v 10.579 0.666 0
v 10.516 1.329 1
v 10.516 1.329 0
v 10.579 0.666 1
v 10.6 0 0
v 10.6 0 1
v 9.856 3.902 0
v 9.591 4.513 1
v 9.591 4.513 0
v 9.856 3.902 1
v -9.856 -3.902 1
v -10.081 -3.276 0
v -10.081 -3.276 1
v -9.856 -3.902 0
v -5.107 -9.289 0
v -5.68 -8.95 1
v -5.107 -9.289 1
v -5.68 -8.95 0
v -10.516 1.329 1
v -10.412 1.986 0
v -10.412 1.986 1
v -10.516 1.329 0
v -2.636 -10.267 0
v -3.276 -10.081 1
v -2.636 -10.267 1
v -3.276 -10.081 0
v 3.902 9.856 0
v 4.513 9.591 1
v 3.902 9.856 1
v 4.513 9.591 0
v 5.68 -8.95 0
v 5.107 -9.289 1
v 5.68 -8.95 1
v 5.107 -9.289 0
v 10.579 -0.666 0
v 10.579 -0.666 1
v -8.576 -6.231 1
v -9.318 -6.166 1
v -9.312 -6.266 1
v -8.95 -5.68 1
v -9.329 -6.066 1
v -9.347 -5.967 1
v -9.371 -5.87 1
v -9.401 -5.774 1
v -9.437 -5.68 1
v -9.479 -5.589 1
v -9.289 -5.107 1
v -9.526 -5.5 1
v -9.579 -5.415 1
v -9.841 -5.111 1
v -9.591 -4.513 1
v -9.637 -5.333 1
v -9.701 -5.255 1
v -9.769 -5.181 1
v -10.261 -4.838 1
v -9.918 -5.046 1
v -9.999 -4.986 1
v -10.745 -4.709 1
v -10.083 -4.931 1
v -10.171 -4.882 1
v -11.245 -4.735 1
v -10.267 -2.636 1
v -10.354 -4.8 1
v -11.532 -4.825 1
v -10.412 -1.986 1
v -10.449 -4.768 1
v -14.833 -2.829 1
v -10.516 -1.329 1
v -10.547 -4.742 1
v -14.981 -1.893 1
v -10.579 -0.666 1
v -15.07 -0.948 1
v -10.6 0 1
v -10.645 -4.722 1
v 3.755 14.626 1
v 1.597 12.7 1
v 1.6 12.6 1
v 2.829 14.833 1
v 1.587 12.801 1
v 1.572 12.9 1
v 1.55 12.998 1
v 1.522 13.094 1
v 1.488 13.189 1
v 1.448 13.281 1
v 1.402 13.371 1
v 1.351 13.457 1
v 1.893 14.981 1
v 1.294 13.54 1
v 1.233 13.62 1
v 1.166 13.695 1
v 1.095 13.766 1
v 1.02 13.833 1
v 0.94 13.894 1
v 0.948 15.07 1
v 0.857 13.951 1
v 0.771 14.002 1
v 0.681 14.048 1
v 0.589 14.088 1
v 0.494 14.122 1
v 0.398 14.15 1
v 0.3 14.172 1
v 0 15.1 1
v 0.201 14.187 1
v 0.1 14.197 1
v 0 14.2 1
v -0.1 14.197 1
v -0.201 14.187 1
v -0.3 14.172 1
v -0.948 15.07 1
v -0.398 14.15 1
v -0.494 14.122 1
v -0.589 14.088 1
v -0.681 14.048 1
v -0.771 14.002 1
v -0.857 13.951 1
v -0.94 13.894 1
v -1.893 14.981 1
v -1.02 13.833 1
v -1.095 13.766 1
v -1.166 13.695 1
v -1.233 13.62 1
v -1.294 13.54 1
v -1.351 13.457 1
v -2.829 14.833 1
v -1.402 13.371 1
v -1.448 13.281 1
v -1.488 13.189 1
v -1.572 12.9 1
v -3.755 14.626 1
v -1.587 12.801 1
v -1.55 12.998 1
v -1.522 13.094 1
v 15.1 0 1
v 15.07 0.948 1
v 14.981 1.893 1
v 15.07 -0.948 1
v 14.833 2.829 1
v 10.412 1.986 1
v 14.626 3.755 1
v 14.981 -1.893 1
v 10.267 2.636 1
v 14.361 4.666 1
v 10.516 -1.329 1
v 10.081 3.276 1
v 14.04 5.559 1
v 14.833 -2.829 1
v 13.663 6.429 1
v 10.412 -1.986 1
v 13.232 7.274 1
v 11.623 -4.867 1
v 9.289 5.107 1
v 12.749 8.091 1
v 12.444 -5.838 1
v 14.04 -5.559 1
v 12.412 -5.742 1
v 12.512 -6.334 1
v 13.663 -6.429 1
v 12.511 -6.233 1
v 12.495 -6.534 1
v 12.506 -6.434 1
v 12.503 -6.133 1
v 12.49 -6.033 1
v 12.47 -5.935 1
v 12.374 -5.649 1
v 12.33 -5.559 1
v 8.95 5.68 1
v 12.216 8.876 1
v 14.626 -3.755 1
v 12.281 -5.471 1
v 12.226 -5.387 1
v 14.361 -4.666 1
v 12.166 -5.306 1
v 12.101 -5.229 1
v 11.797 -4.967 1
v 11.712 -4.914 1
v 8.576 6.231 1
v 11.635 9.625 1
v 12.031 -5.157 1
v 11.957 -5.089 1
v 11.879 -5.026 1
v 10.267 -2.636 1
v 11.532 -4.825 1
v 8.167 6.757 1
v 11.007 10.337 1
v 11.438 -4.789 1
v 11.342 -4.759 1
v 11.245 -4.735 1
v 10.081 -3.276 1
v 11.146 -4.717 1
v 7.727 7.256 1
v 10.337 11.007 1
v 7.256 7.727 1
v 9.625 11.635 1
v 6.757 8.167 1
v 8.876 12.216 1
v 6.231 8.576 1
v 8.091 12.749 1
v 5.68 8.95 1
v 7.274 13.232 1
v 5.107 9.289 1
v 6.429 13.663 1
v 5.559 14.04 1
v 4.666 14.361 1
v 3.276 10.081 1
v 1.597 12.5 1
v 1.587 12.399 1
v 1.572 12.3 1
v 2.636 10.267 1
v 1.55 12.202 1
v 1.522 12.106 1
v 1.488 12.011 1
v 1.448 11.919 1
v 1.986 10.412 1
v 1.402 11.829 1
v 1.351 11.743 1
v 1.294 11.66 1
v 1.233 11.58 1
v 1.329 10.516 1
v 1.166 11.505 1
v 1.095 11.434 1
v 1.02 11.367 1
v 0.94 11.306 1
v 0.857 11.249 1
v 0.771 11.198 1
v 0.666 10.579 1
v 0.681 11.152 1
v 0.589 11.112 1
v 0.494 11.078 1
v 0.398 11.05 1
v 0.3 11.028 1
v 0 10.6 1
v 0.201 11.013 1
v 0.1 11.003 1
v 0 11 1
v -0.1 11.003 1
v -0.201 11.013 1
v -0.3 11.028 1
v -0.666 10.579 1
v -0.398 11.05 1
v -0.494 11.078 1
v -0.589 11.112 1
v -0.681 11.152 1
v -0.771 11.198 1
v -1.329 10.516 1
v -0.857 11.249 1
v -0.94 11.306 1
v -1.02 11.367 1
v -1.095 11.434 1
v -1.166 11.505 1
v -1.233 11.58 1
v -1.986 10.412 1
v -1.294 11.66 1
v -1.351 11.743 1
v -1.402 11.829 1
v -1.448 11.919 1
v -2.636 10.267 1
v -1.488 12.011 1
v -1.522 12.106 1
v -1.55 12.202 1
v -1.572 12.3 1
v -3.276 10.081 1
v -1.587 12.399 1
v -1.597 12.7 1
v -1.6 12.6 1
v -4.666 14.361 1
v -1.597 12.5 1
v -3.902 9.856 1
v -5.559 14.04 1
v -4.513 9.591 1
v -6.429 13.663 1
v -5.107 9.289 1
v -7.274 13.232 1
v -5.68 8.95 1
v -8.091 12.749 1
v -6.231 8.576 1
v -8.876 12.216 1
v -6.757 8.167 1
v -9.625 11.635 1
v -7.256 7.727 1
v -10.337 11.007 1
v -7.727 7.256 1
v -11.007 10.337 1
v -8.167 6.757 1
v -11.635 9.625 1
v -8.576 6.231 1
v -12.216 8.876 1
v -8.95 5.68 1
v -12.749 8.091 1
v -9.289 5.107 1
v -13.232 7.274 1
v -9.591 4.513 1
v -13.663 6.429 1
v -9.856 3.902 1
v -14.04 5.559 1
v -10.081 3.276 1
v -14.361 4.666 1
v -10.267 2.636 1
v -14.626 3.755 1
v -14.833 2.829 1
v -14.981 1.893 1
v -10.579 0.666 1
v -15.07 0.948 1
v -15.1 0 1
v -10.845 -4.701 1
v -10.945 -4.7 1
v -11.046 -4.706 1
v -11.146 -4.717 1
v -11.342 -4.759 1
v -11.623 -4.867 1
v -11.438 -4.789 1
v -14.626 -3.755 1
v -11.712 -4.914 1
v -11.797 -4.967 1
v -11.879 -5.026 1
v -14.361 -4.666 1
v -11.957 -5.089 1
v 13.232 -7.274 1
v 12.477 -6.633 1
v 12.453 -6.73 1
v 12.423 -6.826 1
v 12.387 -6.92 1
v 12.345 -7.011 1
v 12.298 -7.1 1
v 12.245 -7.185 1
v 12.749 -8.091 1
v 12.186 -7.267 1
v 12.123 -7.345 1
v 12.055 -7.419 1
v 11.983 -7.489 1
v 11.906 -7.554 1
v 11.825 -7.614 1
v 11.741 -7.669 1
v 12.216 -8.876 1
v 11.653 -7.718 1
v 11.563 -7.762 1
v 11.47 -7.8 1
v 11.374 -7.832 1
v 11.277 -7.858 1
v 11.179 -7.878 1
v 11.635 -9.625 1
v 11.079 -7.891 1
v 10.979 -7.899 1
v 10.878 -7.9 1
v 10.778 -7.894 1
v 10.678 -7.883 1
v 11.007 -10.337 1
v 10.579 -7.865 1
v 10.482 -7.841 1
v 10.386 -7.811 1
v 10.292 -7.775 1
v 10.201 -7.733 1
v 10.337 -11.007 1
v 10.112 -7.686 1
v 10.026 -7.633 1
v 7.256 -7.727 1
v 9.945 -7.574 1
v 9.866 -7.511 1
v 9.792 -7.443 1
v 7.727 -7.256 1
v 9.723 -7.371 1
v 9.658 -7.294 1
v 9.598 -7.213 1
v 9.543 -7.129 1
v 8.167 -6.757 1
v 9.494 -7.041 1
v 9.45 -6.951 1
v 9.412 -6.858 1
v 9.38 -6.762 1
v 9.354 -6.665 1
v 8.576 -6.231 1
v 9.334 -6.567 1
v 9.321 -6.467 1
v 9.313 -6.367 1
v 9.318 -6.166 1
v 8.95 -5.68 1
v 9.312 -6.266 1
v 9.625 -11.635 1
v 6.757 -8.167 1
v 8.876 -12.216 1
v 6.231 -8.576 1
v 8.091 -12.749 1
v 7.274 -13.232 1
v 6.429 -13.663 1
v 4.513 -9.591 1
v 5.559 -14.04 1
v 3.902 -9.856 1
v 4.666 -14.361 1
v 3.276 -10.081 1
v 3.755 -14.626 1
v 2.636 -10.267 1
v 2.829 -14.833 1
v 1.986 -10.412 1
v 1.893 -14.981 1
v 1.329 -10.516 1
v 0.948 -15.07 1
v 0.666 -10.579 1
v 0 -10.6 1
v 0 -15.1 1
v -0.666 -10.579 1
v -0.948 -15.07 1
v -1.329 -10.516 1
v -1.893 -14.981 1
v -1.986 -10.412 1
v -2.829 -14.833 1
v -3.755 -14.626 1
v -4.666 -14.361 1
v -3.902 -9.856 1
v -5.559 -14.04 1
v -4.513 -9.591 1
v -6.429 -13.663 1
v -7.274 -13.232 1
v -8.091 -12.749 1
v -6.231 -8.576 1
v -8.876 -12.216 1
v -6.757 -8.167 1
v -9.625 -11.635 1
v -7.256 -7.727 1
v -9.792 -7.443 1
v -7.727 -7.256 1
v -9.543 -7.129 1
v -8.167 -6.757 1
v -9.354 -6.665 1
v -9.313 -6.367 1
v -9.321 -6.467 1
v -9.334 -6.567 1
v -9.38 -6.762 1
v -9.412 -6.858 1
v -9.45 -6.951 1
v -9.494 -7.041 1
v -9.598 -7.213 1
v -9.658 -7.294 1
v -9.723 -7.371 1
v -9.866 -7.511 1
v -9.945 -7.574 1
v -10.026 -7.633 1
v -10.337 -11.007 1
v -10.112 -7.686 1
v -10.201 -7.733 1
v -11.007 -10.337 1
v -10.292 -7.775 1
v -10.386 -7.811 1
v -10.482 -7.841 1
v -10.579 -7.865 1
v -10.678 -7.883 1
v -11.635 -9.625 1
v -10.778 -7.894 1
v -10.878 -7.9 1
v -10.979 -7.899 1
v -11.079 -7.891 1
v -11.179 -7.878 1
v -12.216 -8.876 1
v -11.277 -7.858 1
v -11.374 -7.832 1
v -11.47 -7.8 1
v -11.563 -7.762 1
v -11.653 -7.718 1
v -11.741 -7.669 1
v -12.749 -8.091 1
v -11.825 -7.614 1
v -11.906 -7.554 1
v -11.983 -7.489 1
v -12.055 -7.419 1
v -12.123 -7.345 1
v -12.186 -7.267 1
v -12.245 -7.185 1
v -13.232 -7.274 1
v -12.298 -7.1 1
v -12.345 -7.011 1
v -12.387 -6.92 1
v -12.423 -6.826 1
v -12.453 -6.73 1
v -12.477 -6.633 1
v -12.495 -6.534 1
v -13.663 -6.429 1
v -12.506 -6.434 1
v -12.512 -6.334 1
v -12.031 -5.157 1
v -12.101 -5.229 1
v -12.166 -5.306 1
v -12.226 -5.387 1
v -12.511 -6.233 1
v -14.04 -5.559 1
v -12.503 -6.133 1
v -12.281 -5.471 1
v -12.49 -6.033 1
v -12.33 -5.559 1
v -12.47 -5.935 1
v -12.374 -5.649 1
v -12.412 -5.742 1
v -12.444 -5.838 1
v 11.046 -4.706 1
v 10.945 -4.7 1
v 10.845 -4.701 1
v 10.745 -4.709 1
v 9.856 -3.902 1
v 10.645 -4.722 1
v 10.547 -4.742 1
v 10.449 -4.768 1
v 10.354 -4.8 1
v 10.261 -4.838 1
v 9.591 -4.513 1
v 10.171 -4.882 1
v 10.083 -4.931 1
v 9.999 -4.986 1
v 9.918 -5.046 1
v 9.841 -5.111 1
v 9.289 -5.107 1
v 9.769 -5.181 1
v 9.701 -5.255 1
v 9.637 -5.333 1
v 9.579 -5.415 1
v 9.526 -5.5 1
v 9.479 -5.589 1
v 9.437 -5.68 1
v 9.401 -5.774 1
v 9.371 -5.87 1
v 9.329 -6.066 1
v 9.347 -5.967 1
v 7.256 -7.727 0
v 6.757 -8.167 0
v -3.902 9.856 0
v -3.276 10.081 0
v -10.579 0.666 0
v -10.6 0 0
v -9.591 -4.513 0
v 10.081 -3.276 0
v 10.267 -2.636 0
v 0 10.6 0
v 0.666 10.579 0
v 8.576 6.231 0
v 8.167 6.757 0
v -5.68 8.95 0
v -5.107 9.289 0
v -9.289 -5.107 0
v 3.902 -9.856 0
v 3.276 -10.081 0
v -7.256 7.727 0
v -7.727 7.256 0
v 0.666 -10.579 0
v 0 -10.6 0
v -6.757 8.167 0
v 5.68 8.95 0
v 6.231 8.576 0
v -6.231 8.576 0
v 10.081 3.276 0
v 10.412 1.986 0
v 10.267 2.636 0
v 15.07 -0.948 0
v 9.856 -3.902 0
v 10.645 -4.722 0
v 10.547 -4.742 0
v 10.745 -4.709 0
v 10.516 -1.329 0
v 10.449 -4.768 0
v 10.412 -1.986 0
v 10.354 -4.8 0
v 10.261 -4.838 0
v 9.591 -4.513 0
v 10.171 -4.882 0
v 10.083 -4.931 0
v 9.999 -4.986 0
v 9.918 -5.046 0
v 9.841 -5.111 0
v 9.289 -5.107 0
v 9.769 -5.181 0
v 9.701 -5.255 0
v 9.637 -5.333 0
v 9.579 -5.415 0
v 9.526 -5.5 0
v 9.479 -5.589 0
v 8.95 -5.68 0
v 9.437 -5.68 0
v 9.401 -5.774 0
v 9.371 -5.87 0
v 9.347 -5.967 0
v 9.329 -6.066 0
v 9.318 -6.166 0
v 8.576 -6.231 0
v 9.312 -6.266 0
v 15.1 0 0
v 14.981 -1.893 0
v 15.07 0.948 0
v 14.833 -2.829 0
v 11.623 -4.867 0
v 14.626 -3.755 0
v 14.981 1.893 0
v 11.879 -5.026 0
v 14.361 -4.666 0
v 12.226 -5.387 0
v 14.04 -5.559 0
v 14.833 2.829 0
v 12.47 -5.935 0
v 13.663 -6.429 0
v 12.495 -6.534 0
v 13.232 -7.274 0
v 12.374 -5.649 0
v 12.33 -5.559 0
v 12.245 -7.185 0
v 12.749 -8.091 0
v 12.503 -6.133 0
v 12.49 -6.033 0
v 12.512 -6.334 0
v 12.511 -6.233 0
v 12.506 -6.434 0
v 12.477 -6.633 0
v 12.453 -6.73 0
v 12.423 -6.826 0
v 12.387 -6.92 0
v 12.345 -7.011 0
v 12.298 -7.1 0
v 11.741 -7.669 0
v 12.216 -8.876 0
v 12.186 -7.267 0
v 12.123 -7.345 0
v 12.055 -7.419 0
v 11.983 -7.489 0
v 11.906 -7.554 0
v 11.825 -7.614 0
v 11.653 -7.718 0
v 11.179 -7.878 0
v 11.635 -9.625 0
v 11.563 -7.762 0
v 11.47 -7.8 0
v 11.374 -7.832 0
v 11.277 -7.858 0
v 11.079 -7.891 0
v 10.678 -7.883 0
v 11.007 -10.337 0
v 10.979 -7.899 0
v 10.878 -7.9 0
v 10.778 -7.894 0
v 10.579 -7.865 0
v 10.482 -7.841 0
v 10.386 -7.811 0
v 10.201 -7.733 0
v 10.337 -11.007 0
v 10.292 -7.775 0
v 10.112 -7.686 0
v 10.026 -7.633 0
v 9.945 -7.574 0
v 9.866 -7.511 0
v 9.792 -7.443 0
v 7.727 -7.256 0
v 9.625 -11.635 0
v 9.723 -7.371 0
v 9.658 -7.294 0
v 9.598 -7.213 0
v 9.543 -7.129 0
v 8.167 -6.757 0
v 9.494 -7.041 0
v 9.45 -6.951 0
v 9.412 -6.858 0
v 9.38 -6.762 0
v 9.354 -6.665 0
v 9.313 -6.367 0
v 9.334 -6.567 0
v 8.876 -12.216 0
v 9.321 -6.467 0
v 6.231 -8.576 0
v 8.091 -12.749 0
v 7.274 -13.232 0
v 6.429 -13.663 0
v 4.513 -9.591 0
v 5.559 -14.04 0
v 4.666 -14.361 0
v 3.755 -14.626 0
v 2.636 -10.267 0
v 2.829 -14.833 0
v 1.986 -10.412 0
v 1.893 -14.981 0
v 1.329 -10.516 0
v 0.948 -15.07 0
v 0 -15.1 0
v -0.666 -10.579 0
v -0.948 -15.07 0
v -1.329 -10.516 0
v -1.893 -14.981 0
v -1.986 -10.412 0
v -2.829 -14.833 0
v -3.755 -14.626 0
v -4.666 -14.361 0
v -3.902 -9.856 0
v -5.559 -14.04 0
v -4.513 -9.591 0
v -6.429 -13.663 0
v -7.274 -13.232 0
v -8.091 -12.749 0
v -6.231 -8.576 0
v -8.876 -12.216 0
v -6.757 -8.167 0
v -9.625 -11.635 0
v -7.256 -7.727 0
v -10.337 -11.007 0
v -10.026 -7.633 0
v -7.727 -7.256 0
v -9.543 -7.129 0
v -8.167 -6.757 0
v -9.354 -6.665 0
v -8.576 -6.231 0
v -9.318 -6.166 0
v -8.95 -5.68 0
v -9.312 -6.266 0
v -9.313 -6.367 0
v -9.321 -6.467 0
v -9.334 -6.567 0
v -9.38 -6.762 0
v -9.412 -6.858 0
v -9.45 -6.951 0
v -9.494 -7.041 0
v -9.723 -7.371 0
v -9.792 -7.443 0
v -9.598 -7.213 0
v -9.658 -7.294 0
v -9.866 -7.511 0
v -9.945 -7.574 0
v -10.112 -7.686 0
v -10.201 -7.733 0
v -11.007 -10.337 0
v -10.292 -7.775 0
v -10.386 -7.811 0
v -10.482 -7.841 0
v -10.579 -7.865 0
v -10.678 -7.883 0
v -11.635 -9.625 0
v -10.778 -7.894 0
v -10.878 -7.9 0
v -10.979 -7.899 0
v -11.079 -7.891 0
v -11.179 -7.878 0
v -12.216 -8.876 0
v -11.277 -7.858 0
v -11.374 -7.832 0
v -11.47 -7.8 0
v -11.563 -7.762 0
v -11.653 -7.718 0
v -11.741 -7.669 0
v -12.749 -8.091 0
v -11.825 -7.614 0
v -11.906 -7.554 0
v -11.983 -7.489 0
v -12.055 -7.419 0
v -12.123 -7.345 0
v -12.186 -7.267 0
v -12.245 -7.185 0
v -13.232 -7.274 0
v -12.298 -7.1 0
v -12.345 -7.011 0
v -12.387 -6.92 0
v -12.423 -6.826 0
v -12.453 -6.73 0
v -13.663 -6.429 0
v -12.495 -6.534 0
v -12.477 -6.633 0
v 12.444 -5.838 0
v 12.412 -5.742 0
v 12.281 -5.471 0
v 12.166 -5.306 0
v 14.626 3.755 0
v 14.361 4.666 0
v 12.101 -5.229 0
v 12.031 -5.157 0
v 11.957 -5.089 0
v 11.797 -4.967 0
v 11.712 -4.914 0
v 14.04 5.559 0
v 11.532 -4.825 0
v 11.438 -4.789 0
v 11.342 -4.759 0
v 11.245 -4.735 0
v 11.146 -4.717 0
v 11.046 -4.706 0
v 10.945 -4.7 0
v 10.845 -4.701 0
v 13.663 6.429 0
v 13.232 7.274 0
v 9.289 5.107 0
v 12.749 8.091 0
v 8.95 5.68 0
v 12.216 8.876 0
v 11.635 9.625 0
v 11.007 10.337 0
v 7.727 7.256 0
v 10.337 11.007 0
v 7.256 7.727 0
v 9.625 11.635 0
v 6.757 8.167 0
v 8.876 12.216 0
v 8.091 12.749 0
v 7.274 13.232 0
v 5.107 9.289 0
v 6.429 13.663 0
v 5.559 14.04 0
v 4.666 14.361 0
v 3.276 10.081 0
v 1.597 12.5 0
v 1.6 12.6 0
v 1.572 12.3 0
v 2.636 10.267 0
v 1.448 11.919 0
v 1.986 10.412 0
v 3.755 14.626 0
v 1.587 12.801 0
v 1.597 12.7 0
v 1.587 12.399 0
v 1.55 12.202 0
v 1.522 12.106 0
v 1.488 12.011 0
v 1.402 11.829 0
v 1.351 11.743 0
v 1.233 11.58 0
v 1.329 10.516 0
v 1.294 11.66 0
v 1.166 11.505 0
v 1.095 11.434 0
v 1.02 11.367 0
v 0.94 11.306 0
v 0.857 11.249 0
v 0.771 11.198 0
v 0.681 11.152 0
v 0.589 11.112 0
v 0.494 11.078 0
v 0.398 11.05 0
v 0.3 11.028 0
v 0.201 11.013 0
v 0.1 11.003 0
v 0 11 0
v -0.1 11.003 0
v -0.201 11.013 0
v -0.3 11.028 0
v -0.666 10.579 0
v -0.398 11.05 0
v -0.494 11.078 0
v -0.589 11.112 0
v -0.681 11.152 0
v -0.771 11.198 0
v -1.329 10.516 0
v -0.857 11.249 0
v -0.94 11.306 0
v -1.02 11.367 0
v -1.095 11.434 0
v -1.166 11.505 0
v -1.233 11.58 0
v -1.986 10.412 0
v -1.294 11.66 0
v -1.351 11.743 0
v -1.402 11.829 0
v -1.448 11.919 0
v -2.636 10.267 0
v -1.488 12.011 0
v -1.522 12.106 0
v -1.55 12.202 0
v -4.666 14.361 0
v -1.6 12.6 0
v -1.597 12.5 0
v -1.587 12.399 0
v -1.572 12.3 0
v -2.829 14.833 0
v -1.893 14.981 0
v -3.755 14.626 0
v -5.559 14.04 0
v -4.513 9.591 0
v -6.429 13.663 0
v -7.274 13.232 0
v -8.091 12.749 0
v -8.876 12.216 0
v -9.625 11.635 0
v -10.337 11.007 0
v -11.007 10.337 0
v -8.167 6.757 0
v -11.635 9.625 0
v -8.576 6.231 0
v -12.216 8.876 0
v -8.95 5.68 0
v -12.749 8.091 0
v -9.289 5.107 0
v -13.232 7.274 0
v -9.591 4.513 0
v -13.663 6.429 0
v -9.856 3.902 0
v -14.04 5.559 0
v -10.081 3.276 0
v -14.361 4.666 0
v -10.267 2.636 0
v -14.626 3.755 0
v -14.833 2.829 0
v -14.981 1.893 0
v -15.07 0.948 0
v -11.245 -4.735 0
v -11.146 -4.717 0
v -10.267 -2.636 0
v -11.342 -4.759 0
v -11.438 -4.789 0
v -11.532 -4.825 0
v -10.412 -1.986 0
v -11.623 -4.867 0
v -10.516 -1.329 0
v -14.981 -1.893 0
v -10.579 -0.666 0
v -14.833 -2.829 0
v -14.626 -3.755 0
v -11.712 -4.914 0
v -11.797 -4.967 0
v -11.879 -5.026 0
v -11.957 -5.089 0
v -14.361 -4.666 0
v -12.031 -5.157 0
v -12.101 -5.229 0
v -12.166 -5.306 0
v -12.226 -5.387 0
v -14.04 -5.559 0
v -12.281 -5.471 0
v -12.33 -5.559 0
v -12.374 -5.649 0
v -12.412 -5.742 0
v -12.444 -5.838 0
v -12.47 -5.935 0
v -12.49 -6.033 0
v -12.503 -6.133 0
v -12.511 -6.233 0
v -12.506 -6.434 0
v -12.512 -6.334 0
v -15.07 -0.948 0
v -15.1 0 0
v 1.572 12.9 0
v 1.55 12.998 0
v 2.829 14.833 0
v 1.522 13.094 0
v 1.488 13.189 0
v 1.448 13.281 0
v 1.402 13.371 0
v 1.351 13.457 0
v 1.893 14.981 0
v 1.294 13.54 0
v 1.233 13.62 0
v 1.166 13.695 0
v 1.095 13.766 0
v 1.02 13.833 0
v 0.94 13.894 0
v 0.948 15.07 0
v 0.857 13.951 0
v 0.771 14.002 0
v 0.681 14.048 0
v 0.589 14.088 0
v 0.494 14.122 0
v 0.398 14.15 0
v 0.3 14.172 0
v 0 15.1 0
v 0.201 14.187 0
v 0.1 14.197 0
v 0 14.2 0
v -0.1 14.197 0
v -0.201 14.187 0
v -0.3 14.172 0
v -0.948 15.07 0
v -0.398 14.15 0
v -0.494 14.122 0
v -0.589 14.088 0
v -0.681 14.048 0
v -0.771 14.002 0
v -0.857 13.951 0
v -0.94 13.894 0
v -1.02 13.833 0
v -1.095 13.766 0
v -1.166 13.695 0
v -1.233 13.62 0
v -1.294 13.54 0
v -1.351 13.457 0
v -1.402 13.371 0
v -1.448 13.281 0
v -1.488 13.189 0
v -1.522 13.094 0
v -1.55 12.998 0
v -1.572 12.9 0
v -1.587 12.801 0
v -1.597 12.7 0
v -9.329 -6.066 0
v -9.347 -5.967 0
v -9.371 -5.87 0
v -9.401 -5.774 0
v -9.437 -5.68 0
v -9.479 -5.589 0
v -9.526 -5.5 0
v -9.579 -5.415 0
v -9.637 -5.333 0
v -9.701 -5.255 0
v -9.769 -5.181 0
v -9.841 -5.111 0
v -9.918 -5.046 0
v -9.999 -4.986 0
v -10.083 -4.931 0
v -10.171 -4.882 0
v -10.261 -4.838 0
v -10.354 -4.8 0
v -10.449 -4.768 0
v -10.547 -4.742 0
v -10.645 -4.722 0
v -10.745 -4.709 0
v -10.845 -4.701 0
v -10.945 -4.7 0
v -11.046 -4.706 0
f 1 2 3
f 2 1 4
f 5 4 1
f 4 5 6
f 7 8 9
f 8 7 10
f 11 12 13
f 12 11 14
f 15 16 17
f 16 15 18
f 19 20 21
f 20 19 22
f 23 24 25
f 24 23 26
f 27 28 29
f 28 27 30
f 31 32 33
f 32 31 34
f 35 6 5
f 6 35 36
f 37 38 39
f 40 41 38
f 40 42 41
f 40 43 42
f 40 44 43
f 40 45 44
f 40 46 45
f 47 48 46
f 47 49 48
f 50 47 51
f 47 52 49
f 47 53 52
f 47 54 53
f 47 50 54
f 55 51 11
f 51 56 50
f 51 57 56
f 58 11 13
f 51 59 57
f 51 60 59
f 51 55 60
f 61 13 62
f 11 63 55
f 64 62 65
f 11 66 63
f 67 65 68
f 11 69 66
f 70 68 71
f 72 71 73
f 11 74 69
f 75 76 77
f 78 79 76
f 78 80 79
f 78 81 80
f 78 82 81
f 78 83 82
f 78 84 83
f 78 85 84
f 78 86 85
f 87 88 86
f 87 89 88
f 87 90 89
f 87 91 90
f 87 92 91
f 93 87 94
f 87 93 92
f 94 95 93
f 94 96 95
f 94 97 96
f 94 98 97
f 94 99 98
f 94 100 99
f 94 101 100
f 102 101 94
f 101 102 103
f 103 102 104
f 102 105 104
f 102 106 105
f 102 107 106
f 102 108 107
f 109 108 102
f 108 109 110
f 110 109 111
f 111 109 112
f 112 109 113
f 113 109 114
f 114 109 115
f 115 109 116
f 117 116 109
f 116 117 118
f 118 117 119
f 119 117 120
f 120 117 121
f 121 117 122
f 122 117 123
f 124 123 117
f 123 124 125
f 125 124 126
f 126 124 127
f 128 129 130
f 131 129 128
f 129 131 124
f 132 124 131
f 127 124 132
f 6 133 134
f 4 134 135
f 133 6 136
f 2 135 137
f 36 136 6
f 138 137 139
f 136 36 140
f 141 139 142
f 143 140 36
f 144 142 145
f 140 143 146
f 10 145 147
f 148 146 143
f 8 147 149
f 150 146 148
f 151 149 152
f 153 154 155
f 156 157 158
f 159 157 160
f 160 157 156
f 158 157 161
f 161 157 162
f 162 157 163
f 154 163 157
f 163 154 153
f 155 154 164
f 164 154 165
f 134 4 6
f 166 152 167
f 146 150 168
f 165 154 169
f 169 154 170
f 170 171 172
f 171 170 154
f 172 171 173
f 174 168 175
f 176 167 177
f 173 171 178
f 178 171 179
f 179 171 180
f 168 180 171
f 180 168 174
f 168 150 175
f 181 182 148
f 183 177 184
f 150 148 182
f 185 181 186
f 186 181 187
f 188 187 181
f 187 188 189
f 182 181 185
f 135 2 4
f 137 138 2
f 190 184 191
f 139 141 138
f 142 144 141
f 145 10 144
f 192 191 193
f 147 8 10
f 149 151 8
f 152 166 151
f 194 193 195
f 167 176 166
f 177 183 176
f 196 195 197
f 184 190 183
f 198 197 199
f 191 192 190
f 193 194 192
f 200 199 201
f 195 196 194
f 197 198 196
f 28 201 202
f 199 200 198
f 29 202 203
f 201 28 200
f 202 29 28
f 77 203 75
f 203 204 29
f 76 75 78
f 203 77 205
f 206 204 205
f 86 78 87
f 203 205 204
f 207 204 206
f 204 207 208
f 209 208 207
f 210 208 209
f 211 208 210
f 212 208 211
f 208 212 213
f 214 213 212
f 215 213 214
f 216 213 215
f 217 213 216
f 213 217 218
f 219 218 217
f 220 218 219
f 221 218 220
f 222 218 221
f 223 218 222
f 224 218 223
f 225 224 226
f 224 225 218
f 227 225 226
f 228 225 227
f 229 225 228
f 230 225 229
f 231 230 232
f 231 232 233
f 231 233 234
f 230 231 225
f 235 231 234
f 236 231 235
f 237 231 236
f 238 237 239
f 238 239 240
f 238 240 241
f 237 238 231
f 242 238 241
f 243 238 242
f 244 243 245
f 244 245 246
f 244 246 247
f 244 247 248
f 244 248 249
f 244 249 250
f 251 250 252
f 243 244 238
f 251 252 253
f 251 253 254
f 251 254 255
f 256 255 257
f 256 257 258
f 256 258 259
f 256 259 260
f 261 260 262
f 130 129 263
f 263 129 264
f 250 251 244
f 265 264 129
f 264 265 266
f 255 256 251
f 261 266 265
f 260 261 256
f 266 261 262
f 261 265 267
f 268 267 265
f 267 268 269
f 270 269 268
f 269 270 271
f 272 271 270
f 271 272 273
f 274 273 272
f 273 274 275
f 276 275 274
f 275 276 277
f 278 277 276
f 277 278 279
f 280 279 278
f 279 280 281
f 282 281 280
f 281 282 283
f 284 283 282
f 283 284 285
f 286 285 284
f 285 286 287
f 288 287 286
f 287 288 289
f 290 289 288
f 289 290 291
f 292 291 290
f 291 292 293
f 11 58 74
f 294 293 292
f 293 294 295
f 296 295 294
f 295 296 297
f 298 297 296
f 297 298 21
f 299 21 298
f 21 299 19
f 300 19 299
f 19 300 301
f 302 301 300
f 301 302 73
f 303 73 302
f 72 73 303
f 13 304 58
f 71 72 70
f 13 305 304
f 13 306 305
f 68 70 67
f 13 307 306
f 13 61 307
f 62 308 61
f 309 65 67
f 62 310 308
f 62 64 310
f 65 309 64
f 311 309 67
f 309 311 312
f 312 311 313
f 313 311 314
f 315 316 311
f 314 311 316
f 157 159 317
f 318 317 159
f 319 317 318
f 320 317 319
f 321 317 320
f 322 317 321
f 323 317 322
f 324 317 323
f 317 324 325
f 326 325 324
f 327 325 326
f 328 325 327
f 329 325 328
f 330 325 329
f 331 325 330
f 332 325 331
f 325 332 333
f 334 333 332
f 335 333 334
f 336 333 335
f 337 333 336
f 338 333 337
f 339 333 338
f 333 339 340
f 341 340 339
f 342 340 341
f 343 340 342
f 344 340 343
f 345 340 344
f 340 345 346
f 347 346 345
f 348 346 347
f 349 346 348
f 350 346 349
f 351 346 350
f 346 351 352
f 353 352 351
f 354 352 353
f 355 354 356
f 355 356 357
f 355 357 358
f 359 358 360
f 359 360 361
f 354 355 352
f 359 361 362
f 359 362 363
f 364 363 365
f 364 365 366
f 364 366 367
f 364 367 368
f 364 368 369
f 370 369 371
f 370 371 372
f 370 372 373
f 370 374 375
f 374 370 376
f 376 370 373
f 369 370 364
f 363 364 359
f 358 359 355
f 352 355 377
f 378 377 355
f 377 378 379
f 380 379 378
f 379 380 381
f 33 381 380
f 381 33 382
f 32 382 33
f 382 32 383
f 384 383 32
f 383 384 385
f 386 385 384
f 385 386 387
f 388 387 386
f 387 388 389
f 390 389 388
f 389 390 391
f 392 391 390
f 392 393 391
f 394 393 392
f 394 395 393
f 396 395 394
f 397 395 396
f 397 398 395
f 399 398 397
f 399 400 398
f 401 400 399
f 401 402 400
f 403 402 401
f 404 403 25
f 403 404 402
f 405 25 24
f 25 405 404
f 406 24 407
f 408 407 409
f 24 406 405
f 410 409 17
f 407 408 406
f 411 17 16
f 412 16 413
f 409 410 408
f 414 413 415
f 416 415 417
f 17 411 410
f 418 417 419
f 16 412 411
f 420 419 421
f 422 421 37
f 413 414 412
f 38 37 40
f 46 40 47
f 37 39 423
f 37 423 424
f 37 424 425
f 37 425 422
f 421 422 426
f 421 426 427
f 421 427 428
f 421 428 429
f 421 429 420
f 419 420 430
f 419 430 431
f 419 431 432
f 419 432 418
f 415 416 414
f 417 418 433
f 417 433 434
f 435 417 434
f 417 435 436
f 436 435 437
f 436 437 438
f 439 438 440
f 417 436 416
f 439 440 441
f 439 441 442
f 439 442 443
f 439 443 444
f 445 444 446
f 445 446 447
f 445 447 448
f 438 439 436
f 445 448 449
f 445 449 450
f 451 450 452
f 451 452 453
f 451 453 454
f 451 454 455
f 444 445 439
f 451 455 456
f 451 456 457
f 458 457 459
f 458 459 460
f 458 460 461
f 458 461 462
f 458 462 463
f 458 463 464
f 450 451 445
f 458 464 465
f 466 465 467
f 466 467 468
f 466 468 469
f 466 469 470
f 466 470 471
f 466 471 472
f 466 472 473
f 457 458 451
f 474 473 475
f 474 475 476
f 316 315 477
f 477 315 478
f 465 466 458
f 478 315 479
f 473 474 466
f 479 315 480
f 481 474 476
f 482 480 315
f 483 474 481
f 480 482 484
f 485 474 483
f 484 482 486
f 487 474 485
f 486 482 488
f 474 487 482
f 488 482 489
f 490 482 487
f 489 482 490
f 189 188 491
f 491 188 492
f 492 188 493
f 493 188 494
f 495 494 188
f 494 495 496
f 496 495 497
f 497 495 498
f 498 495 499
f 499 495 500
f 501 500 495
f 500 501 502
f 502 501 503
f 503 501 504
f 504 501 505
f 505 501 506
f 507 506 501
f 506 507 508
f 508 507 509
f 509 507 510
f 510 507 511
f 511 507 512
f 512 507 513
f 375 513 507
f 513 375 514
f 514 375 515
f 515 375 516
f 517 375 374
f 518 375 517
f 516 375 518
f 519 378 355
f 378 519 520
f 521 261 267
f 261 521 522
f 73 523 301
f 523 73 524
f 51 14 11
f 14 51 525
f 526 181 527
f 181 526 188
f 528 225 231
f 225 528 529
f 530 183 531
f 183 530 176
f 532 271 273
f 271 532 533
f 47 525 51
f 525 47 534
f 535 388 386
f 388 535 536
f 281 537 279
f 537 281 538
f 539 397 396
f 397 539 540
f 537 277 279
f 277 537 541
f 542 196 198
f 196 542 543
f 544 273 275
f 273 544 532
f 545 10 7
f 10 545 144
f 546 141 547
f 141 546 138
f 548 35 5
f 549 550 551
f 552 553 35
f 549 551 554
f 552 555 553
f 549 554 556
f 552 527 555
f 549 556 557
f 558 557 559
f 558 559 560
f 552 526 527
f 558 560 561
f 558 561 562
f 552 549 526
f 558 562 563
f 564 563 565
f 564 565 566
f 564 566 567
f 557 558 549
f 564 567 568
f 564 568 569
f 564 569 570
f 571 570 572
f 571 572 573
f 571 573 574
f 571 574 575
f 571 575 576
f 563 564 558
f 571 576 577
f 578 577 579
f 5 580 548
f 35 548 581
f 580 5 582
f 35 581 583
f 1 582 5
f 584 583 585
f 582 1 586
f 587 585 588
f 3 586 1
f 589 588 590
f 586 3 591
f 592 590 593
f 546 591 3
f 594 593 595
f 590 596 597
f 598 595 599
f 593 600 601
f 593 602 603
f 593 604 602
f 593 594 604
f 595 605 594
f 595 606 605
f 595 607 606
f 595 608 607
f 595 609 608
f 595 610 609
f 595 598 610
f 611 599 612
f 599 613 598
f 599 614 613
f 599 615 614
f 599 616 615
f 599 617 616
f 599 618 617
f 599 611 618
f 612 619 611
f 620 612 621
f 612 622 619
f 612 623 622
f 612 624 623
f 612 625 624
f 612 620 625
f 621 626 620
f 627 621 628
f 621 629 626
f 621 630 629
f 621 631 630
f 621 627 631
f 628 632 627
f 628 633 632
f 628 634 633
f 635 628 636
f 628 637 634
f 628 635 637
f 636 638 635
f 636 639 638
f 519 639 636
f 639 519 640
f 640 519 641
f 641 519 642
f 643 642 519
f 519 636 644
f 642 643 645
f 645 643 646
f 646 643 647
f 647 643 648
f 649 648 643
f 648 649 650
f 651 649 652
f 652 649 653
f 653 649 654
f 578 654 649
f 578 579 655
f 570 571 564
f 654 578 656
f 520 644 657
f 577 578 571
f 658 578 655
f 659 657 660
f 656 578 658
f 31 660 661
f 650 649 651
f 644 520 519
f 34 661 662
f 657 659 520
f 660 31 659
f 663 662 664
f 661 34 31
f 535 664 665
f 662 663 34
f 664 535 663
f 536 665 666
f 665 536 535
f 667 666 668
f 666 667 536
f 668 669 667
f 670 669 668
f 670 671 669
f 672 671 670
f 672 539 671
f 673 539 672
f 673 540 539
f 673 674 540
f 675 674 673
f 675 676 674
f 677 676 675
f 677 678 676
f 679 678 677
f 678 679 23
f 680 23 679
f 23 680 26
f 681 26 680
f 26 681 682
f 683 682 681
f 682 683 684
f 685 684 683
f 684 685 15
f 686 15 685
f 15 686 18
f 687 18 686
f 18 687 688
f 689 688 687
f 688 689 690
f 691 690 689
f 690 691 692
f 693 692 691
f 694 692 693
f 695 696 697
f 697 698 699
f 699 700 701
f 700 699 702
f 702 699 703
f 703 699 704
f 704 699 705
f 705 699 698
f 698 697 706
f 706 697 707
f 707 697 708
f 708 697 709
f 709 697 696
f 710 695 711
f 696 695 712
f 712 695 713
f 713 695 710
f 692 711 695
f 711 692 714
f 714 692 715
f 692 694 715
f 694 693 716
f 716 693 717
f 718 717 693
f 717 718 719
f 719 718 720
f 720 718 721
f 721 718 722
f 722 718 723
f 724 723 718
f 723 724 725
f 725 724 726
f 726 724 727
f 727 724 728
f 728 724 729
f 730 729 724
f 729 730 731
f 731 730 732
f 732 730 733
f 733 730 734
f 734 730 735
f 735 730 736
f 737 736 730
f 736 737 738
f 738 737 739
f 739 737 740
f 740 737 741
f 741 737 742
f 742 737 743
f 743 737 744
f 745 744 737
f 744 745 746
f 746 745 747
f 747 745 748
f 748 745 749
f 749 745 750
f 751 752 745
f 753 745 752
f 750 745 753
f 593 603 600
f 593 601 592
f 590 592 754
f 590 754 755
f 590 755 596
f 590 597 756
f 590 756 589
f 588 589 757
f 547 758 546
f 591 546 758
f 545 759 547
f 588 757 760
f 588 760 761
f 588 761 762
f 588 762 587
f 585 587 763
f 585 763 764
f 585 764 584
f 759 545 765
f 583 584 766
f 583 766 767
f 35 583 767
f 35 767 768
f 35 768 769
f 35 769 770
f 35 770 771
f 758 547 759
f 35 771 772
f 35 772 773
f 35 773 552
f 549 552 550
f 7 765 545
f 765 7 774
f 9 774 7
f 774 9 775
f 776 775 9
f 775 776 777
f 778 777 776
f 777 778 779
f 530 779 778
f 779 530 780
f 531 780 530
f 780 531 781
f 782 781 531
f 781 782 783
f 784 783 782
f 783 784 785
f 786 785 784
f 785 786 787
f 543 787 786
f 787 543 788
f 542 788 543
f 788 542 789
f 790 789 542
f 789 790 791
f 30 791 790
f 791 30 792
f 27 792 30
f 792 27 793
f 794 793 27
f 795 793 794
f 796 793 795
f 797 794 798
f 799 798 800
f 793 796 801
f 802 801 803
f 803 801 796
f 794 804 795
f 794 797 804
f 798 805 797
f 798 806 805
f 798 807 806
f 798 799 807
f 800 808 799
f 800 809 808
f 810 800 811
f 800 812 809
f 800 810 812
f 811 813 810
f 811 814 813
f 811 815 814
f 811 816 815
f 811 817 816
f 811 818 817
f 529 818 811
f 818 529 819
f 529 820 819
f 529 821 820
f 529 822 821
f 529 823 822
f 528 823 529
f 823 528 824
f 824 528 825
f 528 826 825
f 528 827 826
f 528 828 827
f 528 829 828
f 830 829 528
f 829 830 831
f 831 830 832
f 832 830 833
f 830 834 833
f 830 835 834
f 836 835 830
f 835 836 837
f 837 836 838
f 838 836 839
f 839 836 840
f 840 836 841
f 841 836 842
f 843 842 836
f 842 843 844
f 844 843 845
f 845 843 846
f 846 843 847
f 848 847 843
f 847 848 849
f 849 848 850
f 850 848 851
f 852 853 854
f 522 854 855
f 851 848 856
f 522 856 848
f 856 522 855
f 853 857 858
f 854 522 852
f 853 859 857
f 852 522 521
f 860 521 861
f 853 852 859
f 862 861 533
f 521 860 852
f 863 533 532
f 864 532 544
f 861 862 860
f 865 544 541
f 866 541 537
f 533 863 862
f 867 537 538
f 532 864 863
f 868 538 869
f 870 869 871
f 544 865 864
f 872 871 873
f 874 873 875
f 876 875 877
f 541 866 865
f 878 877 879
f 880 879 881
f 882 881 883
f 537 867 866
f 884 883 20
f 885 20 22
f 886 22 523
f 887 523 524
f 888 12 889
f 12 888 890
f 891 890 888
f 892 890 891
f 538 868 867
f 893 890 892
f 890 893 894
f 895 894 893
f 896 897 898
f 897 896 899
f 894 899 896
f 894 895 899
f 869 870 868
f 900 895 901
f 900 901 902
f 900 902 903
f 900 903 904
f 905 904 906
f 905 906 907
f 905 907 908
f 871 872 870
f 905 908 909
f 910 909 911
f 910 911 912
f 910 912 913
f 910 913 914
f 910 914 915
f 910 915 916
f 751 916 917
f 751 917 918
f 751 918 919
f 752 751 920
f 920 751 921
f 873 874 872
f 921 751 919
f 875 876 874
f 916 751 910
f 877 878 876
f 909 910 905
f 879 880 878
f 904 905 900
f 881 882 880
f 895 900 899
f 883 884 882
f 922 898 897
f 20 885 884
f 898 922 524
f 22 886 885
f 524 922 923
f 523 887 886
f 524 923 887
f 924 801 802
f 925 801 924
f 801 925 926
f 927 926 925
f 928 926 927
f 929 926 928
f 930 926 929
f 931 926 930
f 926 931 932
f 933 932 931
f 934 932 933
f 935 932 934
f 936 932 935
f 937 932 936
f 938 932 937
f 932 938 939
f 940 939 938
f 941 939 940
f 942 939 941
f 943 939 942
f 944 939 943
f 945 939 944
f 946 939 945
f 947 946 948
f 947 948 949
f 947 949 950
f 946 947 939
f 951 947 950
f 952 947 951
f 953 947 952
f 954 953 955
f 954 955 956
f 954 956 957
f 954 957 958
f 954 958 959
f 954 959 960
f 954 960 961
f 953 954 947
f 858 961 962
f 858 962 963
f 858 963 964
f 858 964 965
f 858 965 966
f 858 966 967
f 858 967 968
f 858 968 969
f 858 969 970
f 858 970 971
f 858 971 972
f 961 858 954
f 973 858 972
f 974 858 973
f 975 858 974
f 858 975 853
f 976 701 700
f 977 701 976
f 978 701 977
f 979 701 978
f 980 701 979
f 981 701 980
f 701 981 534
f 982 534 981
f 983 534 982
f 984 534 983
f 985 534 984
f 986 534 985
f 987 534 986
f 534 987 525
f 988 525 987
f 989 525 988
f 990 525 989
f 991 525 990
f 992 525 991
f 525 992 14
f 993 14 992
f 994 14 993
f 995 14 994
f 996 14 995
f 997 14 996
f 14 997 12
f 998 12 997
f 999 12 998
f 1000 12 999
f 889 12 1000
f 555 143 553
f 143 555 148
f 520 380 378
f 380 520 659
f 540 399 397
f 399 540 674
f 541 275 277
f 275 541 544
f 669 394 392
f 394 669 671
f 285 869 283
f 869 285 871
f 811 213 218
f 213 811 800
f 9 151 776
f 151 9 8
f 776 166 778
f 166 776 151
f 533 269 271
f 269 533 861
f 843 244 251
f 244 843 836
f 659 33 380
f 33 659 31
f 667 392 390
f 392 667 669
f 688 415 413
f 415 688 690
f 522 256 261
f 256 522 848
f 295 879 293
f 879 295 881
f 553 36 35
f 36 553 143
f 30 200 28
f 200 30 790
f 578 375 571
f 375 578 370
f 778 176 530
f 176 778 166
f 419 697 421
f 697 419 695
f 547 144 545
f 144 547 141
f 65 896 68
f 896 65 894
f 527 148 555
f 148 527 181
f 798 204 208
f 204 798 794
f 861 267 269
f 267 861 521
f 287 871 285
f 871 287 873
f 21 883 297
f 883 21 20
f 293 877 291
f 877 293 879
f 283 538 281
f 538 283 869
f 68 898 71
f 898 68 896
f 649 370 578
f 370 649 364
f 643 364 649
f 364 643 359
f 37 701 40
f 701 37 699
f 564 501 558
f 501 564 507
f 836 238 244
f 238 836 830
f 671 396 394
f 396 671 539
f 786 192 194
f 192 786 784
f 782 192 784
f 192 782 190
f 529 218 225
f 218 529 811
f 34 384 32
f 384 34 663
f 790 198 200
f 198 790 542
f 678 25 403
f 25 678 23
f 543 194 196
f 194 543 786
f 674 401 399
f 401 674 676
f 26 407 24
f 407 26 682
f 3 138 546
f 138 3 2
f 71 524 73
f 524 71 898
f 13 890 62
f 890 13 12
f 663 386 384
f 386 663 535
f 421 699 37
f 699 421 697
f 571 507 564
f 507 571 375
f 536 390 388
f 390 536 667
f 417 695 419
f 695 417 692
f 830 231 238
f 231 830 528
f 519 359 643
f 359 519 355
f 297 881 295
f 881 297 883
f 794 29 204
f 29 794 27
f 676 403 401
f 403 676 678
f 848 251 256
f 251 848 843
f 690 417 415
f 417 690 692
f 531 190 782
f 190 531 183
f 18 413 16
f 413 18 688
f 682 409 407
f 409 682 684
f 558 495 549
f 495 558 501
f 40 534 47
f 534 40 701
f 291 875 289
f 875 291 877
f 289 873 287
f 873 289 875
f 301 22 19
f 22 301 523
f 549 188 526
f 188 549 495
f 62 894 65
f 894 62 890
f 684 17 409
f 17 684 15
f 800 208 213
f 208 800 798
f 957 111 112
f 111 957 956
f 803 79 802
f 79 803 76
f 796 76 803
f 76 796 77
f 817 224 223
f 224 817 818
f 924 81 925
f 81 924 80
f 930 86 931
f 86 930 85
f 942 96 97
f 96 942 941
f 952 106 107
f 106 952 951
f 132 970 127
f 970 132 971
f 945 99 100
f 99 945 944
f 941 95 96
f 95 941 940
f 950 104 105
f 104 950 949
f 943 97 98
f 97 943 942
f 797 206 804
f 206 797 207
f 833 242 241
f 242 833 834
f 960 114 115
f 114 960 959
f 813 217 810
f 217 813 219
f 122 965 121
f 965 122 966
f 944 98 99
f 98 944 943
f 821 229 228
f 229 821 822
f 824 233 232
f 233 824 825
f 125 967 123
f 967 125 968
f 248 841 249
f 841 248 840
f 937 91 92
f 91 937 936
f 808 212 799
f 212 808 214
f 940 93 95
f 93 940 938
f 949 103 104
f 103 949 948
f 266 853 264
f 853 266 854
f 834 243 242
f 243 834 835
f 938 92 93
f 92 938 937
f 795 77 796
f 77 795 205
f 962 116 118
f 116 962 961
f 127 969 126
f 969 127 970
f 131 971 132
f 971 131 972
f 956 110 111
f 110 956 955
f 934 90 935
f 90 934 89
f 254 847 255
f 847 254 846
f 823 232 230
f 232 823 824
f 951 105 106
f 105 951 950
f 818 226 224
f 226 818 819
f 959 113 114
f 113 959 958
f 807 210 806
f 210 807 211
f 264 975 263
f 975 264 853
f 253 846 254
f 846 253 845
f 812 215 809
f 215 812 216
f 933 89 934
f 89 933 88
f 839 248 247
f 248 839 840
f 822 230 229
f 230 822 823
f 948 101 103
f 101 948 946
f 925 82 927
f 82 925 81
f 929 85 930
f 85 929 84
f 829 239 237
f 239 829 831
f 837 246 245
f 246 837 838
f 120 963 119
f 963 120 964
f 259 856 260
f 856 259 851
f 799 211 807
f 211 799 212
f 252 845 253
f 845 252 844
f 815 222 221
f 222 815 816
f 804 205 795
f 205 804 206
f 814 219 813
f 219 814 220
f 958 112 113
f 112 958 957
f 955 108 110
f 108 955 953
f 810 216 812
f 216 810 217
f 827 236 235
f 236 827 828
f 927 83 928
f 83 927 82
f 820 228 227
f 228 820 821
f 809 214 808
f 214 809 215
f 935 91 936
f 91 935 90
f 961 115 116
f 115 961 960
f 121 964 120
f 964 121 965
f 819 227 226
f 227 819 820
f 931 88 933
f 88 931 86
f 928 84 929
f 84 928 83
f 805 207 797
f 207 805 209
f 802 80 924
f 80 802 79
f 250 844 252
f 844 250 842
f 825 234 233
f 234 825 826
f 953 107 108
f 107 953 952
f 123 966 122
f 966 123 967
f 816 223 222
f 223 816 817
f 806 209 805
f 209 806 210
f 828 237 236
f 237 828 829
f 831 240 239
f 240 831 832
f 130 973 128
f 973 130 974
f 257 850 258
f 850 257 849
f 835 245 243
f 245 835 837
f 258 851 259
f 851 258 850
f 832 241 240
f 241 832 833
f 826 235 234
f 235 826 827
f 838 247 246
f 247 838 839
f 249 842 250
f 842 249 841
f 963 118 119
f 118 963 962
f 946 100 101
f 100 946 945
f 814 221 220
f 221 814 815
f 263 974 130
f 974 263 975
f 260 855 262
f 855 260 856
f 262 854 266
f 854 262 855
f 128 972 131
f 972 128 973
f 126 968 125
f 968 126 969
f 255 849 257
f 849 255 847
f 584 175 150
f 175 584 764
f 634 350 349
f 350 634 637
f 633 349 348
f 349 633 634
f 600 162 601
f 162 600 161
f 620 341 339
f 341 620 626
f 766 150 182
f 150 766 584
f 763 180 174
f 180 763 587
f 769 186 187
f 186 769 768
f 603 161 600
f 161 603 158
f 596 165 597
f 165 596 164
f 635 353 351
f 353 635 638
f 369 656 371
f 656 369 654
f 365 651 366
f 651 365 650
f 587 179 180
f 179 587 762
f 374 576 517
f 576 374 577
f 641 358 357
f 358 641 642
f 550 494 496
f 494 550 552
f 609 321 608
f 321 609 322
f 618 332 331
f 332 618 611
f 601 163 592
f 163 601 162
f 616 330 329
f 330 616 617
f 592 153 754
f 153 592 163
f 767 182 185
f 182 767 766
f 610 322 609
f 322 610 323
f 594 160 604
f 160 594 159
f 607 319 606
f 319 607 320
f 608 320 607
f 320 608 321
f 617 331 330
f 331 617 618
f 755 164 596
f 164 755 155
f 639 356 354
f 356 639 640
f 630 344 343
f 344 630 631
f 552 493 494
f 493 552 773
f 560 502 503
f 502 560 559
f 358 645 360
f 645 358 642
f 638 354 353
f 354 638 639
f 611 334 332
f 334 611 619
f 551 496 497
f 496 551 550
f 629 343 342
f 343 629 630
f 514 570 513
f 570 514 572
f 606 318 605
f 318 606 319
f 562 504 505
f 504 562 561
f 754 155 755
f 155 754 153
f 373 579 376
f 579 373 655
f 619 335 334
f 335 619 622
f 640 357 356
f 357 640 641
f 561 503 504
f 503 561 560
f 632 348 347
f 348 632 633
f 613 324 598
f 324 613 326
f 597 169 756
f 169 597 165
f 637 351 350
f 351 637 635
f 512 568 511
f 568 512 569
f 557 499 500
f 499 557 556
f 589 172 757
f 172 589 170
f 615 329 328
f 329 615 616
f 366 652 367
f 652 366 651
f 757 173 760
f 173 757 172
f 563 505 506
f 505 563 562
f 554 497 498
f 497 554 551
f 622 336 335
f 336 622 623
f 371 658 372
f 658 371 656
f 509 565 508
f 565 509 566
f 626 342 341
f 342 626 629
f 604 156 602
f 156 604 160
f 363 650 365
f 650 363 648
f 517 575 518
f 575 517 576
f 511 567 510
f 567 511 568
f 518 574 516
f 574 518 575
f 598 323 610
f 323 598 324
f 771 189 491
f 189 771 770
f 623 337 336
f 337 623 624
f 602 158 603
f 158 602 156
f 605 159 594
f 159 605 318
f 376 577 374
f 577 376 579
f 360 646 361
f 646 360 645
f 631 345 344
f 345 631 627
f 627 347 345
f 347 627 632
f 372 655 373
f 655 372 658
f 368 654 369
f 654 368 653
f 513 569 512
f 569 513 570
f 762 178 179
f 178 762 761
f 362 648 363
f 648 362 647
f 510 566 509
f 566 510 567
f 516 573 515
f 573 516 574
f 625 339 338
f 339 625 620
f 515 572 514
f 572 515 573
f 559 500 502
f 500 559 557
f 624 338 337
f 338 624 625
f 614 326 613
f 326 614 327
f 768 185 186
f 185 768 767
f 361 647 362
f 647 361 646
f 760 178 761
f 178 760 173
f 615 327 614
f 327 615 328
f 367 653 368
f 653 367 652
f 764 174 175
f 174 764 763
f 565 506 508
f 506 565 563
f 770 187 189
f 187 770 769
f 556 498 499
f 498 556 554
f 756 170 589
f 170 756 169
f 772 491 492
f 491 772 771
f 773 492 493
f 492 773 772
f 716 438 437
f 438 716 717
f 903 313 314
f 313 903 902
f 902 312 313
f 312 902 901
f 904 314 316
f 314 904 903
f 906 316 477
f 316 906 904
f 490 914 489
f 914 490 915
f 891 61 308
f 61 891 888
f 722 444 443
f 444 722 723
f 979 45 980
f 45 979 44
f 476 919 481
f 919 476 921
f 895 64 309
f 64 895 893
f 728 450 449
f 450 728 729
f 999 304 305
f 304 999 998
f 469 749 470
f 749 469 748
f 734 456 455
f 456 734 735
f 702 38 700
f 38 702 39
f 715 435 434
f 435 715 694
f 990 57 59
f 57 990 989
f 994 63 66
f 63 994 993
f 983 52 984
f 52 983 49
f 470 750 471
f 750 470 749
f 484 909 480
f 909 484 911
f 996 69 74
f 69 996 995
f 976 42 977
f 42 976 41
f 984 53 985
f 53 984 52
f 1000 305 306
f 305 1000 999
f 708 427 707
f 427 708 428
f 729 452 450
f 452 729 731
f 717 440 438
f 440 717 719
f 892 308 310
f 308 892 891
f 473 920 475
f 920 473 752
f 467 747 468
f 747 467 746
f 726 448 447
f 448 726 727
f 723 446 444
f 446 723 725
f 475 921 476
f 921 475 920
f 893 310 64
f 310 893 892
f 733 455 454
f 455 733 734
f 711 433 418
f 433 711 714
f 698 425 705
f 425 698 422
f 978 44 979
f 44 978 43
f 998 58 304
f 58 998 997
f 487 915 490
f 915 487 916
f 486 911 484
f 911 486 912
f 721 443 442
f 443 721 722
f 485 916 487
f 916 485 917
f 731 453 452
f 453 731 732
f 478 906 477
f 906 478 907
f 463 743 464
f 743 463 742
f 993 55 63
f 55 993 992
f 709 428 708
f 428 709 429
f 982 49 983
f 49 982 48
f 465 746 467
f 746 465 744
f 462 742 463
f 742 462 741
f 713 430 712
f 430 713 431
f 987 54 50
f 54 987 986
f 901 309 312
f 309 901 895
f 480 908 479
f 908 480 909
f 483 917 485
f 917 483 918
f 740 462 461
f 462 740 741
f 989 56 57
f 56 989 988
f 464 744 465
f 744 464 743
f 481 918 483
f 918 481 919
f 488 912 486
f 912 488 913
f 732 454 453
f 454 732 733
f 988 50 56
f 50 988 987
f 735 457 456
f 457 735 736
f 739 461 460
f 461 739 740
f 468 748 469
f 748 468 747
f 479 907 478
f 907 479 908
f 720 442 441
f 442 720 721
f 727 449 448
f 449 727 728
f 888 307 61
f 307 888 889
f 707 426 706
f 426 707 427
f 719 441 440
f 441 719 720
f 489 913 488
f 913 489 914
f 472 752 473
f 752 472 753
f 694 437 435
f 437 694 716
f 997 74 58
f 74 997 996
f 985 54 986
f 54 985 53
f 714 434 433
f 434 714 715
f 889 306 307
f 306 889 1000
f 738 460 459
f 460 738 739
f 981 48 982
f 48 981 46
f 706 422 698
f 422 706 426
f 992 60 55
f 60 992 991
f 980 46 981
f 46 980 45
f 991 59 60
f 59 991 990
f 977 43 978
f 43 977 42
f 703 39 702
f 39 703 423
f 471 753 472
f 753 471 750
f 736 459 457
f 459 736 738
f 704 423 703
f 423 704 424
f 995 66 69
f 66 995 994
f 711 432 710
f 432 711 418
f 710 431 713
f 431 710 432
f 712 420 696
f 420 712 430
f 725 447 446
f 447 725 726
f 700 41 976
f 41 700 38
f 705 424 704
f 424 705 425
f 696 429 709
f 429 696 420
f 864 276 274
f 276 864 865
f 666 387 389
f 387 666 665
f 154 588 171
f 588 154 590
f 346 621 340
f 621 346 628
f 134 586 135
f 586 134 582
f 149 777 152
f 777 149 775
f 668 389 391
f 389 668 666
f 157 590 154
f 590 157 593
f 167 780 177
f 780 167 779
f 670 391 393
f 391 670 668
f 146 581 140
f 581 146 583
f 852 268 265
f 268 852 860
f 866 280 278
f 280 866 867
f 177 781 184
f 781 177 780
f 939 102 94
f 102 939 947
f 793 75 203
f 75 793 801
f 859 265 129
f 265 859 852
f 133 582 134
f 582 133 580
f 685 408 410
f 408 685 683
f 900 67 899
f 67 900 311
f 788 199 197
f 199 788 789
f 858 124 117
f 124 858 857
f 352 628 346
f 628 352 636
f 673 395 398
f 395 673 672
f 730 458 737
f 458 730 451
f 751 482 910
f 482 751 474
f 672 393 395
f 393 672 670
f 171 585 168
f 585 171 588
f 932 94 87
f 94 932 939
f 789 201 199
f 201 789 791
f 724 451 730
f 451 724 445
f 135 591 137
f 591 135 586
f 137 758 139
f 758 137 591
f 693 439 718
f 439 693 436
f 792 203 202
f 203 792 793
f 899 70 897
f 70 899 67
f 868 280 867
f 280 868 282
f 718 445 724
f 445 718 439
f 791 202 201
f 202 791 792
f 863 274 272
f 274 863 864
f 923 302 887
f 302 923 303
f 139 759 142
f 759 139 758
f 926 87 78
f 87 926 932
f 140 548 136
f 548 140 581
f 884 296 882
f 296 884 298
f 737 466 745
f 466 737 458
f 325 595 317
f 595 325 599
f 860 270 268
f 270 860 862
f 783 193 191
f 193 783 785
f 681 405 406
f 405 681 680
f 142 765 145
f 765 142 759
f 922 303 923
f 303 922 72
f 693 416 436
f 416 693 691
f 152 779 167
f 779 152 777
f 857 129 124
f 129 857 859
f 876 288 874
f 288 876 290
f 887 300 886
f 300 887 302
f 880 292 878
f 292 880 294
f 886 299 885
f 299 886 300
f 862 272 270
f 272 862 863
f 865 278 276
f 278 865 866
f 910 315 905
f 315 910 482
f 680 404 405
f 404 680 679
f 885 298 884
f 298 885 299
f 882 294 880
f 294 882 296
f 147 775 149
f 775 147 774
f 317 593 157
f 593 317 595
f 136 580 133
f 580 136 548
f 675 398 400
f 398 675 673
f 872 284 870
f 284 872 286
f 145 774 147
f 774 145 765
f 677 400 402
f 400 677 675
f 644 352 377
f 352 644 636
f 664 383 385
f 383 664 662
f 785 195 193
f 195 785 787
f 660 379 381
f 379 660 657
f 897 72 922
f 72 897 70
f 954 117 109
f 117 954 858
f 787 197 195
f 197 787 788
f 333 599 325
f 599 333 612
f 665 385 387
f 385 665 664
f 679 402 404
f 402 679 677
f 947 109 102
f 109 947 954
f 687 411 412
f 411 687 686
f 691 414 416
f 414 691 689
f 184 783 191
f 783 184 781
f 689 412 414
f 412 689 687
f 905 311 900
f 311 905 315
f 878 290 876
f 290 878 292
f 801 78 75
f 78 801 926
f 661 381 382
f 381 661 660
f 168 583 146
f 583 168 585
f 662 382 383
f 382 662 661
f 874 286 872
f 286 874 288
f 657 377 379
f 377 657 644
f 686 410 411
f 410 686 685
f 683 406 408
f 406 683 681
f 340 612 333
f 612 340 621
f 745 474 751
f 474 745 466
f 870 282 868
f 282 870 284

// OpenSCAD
$fn=100;

module bille_jockey() {
	difference() {
	cylinder(d=30.2, h=1.5);
	
	}
	//translate([0,0,1.5])cylinder(h=8, r1=10.5, r2=7);
	
	difference() {
	translate([0,0,-1.5])sphere(r=10.5);
	translate([0,0,0]) cylinder(d=21,h=5);
	}
}

ep=1;
offset=0.2;

module rehausse_bille(){
	difference(){
	cylinder(d=30.2,h=ep);
		union(){
			cylinder(h=ep, r=10.5+offset/2);
			translate([0,12.6,0])cylinder(d=3+offset,h=ep);
			rotate([0,0,-120])translate([0,12.6,])cylinder(d=3+offset,h=ep);
			rotate([0,0,120])translate([0,12.6,0])cylinder(d=3+offset,h=ep);
		}
	}
}

rehausse_bille();
